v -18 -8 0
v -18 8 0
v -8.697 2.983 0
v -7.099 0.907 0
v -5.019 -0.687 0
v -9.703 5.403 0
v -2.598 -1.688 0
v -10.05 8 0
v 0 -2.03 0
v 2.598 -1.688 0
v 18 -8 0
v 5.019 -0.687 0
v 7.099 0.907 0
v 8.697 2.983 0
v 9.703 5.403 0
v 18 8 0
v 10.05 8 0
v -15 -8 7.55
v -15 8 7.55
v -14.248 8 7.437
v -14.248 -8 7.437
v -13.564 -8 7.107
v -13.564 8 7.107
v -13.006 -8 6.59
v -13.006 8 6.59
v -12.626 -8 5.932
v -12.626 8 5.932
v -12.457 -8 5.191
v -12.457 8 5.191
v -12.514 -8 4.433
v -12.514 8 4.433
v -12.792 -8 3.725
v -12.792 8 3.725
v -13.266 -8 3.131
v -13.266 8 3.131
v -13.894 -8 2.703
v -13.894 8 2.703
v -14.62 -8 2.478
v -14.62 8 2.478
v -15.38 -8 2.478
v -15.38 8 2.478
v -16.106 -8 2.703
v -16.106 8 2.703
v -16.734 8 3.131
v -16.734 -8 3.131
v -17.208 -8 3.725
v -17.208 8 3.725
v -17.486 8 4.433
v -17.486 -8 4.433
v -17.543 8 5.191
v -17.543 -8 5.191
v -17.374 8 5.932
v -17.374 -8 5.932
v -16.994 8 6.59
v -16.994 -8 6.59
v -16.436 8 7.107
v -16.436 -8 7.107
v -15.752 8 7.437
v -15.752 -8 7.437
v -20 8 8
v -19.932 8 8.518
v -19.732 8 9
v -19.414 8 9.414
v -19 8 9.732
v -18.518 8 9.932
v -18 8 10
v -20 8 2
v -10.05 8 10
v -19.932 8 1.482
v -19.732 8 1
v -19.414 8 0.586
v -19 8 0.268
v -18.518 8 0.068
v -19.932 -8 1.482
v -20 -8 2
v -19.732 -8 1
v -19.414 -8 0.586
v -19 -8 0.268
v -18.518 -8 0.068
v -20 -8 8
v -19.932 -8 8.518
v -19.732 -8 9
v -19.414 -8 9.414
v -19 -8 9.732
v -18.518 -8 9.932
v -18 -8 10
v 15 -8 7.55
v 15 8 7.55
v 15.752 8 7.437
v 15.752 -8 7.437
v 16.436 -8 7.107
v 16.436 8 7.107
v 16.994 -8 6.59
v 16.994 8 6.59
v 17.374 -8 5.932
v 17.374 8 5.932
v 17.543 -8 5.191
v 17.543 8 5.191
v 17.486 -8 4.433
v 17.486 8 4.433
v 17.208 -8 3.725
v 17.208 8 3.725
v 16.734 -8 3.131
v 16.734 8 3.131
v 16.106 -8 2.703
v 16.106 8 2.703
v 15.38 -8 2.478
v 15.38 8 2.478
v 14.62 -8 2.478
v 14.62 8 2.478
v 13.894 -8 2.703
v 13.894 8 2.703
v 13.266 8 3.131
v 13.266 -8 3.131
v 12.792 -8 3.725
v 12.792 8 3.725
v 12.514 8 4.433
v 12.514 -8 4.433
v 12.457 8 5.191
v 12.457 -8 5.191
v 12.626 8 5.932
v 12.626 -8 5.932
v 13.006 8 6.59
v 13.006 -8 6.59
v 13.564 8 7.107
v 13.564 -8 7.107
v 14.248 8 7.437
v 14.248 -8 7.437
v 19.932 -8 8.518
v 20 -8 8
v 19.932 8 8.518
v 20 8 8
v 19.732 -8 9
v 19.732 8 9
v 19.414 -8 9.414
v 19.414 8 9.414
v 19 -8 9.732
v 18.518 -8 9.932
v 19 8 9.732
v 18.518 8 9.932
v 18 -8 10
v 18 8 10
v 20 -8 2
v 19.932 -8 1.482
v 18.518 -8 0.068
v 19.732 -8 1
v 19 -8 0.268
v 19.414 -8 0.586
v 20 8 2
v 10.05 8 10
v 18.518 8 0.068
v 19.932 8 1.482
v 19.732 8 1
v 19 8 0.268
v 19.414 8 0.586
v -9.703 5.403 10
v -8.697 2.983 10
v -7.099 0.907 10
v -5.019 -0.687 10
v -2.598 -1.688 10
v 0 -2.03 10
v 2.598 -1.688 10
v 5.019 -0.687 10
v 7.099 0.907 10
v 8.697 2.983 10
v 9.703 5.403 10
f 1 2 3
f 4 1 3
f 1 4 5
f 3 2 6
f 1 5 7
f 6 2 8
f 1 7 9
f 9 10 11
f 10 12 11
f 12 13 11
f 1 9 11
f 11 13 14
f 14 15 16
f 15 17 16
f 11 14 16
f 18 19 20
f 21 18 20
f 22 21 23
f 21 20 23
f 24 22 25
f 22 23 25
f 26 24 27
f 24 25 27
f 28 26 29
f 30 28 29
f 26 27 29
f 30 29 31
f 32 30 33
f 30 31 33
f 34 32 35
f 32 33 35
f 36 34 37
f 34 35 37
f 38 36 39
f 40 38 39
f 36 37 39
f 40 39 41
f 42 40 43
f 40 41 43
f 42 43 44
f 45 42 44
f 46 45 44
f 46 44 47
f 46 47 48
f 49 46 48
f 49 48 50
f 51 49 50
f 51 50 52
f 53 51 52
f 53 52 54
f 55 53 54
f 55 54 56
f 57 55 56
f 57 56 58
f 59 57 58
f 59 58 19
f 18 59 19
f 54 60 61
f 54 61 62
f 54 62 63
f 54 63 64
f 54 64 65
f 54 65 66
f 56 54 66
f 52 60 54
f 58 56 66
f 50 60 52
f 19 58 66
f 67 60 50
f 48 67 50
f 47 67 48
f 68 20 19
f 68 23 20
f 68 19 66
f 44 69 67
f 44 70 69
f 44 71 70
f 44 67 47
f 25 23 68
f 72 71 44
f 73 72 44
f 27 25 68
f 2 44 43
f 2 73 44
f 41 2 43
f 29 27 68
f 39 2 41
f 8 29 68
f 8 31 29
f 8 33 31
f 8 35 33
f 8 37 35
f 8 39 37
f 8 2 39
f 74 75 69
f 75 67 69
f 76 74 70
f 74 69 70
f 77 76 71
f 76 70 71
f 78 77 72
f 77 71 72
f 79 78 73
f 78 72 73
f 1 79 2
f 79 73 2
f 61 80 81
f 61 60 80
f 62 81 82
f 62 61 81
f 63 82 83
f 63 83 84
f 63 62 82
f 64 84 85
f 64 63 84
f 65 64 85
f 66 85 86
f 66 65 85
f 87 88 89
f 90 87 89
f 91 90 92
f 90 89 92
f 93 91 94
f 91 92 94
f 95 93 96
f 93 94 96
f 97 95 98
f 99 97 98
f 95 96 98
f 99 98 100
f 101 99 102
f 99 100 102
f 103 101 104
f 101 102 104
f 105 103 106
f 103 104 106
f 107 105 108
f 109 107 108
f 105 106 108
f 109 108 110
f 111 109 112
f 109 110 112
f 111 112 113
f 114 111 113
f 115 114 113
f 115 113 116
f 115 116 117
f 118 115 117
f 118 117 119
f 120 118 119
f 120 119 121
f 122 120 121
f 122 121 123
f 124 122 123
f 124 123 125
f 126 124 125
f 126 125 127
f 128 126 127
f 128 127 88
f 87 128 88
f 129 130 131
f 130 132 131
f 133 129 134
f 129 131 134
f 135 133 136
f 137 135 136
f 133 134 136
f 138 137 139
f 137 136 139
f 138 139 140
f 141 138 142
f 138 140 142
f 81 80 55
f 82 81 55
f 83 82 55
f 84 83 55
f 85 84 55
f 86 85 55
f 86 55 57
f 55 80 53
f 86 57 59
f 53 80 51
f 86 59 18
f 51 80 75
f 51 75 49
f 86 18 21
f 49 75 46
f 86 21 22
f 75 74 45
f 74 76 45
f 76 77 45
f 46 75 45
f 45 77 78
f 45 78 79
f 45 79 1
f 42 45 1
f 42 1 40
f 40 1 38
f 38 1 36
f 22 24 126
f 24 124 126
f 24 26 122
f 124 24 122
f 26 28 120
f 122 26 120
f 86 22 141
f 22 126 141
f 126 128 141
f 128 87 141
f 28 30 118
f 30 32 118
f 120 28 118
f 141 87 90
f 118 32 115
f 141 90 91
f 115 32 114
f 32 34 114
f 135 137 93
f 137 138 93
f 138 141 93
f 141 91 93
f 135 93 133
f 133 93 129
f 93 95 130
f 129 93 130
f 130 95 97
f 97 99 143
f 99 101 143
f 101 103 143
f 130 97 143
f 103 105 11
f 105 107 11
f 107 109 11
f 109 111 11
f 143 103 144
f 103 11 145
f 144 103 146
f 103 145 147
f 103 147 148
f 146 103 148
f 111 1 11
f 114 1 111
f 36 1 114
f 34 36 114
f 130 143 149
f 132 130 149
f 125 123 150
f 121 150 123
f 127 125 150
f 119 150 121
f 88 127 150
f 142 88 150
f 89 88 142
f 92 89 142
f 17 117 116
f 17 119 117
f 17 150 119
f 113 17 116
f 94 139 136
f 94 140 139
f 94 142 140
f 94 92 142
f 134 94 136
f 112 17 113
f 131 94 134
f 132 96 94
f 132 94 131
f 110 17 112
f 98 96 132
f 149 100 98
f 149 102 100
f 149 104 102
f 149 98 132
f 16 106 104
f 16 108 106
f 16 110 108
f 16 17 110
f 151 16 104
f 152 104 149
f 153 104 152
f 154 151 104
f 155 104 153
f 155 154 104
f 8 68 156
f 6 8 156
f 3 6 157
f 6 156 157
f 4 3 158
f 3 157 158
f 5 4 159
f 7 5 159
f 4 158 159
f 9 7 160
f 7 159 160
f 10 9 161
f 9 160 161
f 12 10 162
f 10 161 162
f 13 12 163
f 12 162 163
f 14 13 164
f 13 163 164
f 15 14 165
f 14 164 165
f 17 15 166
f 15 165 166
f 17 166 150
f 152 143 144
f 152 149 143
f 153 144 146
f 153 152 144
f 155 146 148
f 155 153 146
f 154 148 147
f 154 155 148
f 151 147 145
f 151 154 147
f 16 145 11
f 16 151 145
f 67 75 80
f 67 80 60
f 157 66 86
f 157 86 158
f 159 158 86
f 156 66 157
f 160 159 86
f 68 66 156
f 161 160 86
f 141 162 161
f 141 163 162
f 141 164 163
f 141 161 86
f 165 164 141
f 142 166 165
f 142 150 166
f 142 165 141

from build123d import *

# Parameters (mm, degrees)
SKETCH1_W           = 40
SKETCH1_H           = 16
BOSS_EXTRUDE1_DEPTH = 10
FILLET1_R           = 2
SKETCH3_R           = 10.05
CUT_EXTRUDE1_DEPTH  = 24.748684174
SKETCH4_R           = 2.55
CUT_EXTRUDE2_DEPTH  = 28.49545417


with BuildPart() as part:
    # Sketch1 → Boss-Extrude1 (new body)
    with BuildSketch(Plane.XY):
        Rectangle(SKETCH1_W, SKETCH1_H)
    extrude(amount=BOSS_EXTRUDE1_DEPTH)

    # Fillet1
    fillet1_edges = [part.edges().sort_by_distance(p)[0] for p in [
        (20, 0, 10),
        (-20, 0, 10),
        (20, 0, 0),
        (-20, 0, 0),
    ]]
    fillet(fillet1_edges, radius=FILLET1_R)

    # Sketch3 → Cut-Extrude1 (cut, through all)
    with BuildSketch(Plane.XY.offset(10)):
        with Locations((0, 8.02)):
            Circle(SKETCH3_R)
    extrude(amount=-CUT_EXTRUDE1_DEPTH, mode=Mode.SUBTRACT)

    # Sketch4 → Cut-Extrude2 (cut, through all)
    with BuildSketch(Plane(origin=(0, 8, 0), x_dir=(1, 0, 0), z_dir=(0, 1, 0))):
        with Locations(Location((-15, -5, 0), (0, 0, 270))):
            Circle(SKETCH4_R)
        with Locations(Location((15, -5, 0), (0, 0, 270))):
            Circle(SKETCH4_R)
    extrude(amount=-CUT_EXTRUDE2_DEPTH, mode=Mode.SUBTRACT)


solid = part.part
